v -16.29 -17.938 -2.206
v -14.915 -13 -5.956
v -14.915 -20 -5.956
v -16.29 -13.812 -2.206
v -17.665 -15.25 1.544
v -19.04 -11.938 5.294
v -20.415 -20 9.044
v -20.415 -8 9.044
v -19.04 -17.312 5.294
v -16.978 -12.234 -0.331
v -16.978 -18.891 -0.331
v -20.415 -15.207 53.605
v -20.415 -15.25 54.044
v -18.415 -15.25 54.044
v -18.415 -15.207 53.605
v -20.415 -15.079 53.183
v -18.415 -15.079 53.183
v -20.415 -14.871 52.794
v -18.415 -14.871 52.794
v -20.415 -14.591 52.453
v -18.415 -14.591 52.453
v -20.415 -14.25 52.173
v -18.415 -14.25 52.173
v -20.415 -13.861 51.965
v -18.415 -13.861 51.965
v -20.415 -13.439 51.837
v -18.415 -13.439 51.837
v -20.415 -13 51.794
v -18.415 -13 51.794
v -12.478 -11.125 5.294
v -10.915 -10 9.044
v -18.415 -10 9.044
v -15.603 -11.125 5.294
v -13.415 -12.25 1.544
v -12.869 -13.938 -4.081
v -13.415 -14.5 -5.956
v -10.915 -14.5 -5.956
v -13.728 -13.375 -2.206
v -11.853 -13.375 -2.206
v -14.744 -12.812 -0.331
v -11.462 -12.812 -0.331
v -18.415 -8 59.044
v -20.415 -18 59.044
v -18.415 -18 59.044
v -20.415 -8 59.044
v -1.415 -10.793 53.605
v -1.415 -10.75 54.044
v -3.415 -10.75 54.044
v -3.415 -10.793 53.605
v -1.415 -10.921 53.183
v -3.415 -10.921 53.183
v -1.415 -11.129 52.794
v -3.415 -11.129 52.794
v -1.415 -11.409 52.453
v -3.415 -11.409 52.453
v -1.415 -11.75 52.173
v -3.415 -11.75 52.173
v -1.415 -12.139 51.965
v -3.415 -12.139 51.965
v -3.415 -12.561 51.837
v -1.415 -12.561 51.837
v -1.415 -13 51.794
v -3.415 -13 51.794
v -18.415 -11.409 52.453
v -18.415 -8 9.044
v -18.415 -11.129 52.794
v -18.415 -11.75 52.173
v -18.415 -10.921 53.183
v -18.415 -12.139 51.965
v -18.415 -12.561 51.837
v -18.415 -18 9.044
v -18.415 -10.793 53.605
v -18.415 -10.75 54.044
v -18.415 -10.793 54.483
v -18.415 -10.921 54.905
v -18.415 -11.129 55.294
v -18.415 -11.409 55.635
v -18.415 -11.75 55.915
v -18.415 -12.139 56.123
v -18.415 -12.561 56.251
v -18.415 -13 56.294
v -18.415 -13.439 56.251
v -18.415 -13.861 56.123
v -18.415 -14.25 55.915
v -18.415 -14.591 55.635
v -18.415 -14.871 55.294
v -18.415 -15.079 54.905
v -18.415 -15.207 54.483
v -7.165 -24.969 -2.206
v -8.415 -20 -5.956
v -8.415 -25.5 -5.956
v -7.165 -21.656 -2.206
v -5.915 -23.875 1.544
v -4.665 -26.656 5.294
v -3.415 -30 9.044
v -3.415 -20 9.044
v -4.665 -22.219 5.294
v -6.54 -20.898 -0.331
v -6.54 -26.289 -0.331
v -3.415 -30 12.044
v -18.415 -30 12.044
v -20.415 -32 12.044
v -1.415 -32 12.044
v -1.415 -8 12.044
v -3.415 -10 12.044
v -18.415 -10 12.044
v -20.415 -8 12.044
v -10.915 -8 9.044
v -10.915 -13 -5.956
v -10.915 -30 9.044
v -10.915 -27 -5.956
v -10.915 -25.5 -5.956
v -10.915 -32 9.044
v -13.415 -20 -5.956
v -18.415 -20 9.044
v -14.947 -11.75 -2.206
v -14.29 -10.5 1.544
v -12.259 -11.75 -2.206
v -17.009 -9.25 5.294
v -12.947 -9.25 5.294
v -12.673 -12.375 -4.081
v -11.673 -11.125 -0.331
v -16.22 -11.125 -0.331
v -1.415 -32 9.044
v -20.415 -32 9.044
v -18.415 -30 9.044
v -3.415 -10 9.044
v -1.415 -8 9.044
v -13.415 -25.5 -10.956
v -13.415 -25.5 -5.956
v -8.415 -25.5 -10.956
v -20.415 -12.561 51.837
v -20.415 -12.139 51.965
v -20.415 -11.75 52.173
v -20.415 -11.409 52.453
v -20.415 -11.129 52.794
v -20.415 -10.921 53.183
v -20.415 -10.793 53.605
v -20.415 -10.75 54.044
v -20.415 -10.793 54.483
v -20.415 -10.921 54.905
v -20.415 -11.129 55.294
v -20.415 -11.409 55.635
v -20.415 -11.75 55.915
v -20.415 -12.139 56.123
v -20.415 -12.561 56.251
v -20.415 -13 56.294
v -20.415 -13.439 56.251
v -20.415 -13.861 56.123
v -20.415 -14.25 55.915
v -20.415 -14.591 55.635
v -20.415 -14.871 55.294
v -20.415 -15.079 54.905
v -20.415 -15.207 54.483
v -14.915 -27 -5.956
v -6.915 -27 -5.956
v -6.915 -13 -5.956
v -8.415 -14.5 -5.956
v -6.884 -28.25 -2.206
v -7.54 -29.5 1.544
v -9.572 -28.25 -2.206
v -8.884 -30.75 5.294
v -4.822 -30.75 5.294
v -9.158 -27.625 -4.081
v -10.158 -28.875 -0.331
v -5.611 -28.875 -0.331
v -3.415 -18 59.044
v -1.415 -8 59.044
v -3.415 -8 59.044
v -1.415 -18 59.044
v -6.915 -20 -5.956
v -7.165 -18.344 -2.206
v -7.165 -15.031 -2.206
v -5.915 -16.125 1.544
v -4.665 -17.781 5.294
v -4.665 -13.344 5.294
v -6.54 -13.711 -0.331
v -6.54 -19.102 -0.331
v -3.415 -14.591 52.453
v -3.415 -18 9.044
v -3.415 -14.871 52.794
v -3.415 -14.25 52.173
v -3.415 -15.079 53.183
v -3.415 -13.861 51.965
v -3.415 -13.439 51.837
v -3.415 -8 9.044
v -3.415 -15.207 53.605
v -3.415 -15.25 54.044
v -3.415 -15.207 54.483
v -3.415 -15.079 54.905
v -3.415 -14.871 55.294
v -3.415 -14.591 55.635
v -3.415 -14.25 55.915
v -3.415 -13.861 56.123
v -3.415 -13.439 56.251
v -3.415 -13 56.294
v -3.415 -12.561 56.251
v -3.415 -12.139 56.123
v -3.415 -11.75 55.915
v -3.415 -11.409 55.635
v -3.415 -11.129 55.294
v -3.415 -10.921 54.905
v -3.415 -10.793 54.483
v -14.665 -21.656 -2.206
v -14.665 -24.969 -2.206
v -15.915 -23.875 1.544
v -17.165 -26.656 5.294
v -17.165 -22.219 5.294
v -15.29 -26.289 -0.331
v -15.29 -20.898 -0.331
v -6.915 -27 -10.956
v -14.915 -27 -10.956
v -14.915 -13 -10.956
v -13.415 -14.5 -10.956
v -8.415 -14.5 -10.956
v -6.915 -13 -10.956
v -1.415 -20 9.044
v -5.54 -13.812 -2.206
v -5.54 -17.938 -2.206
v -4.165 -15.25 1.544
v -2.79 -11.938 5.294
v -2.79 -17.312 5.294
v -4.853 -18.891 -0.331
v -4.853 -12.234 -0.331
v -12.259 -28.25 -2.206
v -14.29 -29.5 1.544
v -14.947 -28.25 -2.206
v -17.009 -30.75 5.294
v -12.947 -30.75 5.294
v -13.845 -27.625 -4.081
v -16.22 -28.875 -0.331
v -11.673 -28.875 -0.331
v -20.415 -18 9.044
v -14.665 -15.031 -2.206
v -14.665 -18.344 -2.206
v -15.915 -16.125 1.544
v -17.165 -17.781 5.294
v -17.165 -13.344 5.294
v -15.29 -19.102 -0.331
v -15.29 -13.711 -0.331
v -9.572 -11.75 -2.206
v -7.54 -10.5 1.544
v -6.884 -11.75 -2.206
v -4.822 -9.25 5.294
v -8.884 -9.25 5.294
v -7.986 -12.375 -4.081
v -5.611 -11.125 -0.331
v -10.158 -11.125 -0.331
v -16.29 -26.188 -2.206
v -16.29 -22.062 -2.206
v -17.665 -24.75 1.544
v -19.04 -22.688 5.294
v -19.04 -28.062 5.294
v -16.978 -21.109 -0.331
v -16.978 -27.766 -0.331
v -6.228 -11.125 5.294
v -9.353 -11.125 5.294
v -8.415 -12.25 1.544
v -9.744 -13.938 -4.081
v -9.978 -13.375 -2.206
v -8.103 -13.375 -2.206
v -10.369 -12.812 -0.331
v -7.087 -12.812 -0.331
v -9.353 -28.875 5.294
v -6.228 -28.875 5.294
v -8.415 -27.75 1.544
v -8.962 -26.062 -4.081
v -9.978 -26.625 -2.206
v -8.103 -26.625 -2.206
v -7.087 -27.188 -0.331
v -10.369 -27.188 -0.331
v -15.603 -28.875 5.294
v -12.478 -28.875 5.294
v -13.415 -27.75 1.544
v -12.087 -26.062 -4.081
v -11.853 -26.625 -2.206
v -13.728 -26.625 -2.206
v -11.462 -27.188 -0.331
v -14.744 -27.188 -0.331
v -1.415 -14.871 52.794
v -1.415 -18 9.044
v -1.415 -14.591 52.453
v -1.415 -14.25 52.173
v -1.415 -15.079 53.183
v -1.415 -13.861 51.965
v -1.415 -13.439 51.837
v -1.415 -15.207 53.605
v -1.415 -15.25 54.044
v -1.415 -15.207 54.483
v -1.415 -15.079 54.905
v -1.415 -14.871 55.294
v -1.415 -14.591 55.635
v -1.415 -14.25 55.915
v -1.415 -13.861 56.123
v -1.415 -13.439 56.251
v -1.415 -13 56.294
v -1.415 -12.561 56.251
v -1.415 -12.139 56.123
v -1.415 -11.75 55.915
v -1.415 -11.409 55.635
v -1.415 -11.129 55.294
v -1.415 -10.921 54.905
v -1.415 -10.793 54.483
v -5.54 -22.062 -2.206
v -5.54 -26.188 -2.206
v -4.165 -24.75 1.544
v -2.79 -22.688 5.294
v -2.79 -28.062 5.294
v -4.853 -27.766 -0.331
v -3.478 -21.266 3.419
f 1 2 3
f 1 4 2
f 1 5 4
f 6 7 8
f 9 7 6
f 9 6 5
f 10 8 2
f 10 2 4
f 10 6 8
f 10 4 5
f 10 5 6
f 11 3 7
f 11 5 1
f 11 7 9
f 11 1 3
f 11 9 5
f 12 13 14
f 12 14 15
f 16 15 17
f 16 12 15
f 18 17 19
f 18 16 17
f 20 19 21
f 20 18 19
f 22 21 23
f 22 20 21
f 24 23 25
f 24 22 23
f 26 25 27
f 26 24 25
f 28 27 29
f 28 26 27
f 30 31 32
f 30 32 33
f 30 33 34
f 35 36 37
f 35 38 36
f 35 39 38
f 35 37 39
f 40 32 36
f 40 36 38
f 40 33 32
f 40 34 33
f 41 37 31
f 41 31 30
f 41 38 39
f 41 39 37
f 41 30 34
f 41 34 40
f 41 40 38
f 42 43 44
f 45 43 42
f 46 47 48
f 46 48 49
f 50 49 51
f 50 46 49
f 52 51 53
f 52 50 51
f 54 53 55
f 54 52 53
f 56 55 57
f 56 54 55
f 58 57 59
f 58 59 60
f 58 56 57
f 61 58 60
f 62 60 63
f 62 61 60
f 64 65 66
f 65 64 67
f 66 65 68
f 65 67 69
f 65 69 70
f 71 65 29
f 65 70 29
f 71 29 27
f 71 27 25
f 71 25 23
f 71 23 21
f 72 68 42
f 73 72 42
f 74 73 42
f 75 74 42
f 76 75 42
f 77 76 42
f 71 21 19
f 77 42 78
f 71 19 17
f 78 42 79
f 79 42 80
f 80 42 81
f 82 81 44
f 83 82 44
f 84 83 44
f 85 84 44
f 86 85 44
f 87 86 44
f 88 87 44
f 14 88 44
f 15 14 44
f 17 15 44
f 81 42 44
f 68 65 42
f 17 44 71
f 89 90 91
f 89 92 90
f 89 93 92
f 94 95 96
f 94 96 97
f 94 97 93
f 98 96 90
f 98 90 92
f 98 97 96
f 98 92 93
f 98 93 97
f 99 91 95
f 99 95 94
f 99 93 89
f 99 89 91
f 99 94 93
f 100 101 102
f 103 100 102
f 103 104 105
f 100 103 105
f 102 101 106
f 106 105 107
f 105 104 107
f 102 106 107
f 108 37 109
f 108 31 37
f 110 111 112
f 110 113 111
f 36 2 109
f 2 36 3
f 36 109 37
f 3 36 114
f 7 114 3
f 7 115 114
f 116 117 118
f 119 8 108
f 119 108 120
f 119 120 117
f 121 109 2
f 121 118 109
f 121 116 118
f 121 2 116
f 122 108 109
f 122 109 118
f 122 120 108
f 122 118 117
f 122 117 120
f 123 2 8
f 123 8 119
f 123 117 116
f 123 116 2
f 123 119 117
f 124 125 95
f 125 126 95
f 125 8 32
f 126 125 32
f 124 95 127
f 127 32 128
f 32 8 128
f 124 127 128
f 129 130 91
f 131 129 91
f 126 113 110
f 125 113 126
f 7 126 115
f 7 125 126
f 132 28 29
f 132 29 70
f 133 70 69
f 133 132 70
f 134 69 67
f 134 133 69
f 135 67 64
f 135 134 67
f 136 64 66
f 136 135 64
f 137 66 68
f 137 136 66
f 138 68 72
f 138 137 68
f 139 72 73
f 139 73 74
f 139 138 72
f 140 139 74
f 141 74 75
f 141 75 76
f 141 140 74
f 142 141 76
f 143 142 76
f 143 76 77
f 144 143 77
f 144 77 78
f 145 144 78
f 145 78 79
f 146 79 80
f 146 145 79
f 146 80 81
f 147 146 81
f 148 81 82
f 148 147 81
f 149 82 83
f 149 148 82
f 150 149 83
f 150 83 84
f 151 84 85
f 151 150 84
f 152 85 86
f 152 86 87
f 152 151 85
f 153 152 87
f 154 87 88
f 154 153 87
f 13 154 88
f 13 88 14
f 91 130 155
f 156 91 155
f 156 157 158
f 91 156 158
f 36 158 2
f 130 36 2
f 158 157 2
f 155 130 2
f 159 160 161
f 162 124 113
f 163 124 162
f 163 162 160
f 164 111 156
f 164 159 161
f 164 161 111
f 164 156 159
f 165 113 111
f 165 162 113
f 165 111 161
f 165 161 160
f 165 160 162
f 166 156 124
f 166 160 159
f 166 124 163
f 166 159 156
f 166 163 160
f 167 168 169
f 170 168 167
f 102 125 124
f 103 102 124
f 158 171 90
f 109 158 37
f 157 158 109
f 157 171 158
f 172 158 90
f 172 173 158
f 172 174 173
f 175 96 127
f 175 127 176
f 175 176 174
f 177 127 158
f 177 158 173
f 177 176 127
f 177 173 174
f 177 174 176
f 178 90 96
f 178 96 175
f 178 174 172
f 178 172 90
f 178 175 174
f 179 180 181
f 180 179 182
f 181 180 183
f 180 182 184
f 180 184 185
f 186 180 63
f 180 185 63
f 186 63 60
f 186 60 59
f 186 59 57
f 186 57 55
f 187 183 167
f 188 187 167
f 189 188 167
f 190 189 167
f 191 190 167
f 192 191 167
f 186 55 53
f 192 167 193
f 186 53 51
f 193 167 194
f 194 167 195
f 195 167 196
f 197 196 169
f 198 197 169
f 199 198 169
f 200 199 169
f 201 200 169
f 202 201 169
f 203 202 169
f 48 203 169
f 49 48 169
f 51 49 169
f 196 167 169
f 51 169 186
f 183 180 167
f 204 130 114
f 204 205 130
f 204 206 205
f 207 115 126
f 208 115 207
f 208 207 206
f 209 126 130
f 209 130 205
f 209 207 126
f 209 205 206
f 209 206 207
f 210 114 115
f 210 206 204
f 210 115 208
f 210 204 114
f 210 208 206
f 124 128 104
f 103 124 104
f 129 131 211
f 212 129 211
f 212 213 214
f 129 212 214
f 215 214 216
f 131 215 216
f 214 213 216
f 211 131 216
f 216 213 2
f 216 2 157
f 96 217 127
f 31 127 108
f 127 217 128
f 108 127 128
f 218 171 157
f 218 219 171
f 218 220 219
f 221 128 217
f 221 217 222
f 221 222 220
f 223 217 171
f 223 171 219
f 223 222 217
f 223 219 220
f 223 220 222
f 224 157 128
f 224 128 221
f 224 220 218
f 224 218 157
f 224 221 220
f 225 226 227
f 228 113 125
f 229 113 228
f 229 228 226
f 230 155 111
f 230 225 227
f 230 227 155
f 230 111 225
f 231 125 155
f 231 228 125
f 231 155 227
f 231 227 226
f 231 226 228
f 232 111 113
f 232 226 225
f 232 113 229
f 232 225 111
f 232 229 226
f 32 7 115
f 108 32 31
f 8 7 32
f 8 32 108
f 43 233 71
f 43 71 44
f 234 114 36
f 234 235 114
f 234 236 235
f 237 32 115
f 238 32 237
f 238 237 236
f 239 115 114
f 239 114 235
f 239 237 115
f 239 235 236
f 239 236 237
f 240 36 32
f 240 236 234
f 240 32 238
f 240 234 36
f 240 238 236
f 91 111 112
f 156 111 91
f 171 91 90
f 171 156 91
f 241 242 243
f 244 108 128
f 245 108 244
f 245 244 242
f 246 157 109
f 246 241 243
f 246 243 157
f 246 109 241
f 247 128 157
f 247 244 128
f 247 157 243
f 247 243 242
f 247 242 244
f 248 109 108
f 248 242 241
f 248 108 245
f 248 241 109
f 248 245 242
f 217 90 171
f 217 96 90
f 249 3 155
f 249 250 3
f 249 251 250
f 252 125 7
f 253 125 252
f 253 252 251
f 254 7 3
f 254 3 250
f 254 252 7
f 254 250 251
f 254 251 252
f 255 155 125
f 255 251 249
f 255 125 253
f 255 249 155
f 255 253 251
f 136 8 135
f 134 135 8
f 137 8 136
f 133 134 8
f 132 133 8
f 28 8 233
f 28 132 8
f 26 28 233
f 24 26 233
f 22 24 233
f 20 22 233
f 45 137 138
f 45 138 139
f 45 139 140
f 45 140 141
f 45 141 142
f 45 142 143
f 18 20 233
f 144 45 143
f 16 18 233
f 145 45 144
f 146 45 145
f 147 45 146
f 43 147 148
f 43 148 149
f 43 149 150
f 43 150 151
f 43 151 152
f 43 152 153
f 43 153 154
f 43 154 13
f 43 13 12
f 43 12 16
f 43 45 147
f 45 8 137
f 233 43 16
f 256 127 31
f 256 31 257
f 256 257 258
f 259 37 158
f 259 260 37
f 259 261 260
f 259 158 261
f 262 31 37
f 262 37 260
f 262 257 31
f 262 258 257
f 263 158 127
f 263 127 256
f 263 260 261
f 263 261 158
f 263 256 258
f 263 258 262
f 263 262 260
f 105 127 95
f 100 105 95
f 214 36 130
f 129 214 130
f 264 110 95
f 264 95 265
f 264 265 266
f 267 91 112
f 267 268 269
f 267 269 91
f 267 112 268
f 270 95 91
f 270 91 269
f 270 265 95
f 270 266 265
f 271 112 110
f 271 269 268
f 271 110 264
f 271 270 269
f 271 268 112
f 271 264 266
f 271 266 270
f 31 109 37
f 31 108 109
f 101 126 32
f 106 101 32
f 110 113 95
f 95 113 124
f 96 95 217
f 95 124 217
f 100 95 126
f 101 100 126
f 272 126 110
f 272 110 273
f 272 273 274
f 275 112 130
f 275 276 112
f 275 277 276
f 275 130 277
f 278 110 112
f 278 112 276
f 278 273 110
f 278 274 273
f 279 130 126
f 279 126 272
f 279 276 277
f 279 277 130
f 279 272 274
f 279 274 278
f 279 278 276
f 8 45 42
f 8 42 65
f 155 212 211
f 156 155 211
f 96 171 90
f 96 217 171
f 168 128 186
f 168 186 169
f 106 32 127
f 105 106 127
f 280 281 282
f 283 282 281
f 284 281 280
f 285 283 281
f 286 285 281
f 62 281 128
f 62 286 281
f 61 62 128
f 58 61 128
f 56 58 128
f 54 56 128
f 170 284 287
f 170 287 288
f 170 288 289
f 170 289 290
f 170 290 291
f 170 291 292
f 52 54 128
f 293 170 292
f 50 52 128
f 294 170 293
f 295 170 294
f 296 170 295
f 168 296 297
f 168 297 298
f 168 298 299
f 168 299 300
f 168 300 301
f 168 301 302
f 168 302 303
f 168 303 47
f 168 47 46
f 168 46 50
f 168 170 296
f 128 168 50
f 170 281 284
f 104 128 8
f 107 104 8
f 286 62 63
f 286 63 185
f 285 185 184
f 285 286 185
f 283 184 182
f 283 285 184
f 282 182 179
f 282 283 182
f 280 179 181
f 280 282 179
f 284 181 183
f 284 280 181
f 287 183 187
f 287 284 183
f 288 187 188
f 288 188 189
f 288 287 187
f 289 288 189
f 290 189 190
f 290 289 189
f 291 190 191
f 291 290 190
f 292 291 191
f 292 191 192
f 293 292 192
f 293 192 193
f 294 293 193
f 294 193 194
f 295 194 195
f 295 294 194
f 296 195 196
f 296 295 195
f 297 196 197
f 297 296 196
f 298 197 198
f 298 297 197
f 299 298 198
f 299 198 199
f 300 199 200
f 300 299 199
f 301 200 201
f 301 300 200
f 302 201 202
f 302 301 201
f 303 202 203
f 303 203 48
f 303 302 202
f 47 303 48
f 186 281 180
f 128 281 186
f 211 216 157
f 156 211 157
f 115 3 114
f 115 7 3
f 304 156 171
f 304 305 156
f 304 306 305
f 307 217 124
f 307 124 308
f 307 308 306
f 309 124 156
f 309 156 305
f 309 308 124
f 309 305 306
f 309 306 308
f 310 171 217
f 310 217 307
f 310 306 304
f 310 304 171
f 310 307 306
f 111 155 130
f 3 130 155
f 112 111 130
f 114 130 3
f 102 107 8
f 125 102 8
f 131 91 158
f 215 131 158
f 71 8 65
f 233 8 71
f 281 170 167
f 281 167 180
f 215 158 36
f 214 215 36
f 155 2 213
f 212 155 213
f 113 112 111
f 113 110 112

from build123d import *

# Parameters (mm, degrees)
F1_DEPTH  = 40
F3_W      = 8
F3_H      = 13
F4_DEPTH  = 25
F2_W      = 9.5
F2_H      = 8
F5_DEPTH  = 25
F7_DEPTH  = 25
F6_W      = 2.5
F6_H      = 5.5
F8_DEPTH  = 25
F13_W     = 5
F13_H     = 4.5464889724
F14_DEPTH = 2
F16_DEPTH = 2


with BuildPart() as f1:
    # F0 (on Front) → F1 (new body)
    with BuildSketch(Plane.XZ):
        Polygon((-1.4153950295, 12.043859912), (-20.4153950295, 12.043859912), (-20.4153950295, 9.043859912), (-10.9153950295, 9.043859912), (-1.4153950295, 9.043859912), align=None)
    extrude(amount=F1_DEPTH)

    # F2 (on face) → F5 (cut)
    with BuildSketch(Plane(origin=(0, 0, 9.043859912), x_dir=(1, 0, 0), z_dir=(0, 0, -1))):
        with Locations((-6.1653950295, 36)):
            Rectangle(F2_W, F2_H)
        with Locations((-15.6653950295, 36)):
            Rectangle(F2_W, F2_H)
        Polygon((-1.4153950295, 0), (-1.4153950295, 8), (-10.9153950295, 8), (-20.4153950295, 8), (-20.4153950295, 0), (-10.9153950295, 0), align=None)
    extrude(amount=-F5_DEPTH, mode=Mode.SUBTRACT)

    # F2 (on face) → F7 (cut)
    with BuildSketch(Plane(origin=(0, 0, 9.043859912), x_dir=(1, 0, 0), z_dir=(0, 0, -1))):
        Polygon((-3.4153950295, 10), (-3.4153950295, 20), (-18.4153950295, 20), (-18.4153950295, 10), (-10.9153950295, 10), align=None)
        Polygon((-18.4153950295, 20), (-3.4153950295, 20), (-3.4153950295, 30), (-10.9153950295, 30), (-18.4153950295, 30), align=None)
    extrude(amount=-F7_DEPTH, mode=Mode.SUBTRACT)


with BuildPart() as f1b:
    # F0 (on Front) → F1, piece 2 (new body)
    with BuildSketch(Plane.XZ):
        Polygon((-6.9153950295, -5.956140088), (-10.9153950295, -5.956140088), (-14.9153950295, -5.956140088), (-14.9153950295, -10.956140088), (-6.9153950295, -10.956140088), align=None)
    extrude(amount=F1_DEPTH)

    # F3 (on face) → F4 (cut)
    with BuildSketch(Plane(origin=(0, 0, -10.956140088), x_dir=(1, 0, 0), z_dir=(0, 0, -1))):
        with Locations((-10.9153950295, 33.5)):
            Rectangle(F3_W, F3_H)
        with Locations((-10.9153950295, 6.5)):
            Rectangle(F3_W, F3_H)
    extrude(amount=-F4_DEPTH, mode=Mode.SUBTRACT)

    # F6 (on face) → F8 (cut)
    with BuildSketch(Plane.XY.offset(-5.956140088)):
        with Locations((-12.1653950295, -17.25)):
            Rectangle(F6_W, F6_H)
        with Locations((-9.6653950295, -17.25)):
            Rectangle(F6_W, F6_H)
        with Locations((-9.6653950295, -22.75)):
            Rectangle(F6_W, F6_H)
        with Locations((-12.1653950295, -22.75)):
            Rectangle(F6_W, F6_H)
    extrude(amount=-F8_DEPTH, mode=Mode.SUBTRACT)


with BuildPart() as f9:
    # F6 (on face) → F9 section 0
    with BuildSketch(Plane.XY.offset(-5.956140088)):
        Polygon((-14.9153950295, -13), (-14.9153950295, -20), (-13.4153950295, -20), (-13.4153950295, -14.5), (-10.9153950295, -14.5), (-10.9153950295, -13), align=None)
    # F2 (on face) → F9 section 1
    with BuildSketch(Plane(origin=(0, 0, 9.043859912), x_dir=(1, 0, 0), z_dir=(0, 0, -1))):
        Polygon((-18.4153950295, 10), (-18.4153950295, 20), (-20.4153950295, 20), (-20.4153950295, 8), (-10.9153950295, 8), (-10.9153950295, 10), align=None)
    loft()


with BuildPart() as f10:
    # F6 (on face) → F10 section 0
    with BuildSketch(Plane.XY.offset(-5.956140088)):
        Polygon((-8.4153950295, -20), (-6.9153950295, -20), (-6.9153950295, -13), (-10.9153950295, -13), (-10.9153950295, -14.5), (-8.4153950295, -14.5), align=None)
    # F2 (on face) → F10 section 1
    with BuildSketch(Plane(origin=(0, 0, 9.043859912), x_dir=(1, 0, 0), z_dir=(0, 0, -1))):
        Polygon((-1.4153950295, 8), (-1.4153950295, 20), (-3.4153950295, 20), (-3.4153950295, 10), (-10.9153950295, 10), (-10.9153950295, 8), align=None)
    loft()


with BuildPart() as f11:
    # F6 (on face) → F11 section 0
    with BuildSketch(Plane.XY.offset(-5.956140088)):
        Polygon((-10.9153950295, -25.5), (-10.9153950295, -27), (-6.9153950295, -27), (-6.9153950295, -20), (-8.4153950295, -20), (-8.4153950295, -25.5), align=None)
    # F2 (on face) → F11 section 1
    with BuildSketch(Plane(origin=(0, 0, 9.043859912), x_dir=(1, 0, 0), z_dir=(0, 0, -1))):
        Polygon((-3.4153950295, 20), (-1.4153950295, 20), (-1.4153950295, 32), (-10.9153950295, 32), (-10.9153950295, 30), (-3.4153950295, 30), align=None)
    loft()


with BuildPart() as f12:
    # F6 (on face) → F12 section 0
    with BuildSketch(Plane.XY.offset(-5.956140088)):
        Polygon((-14.9153950295, -27), (-10.9153950295, -27), (-10.9153950295, -25.5), (-13.4153950295, -25.5), (-13.4153950295, -20), (-14.9153950295, -20), align=None)
    # F2 (on face) → F12 section 1
    with BuildSketch(Plane(origin=(0, 0, 9.043859912), x_dir=(1, 0, 0), z_dir=(0, 0, -1))):
        Polygon((-20.4153950295, 20), (-18.4153950295, 20), (-18.4153950295, 30), (-10.9153950295, 30), (-10.9153950295, 32), (-20.4153950295, 32), align=None)
    loft()


with BuildPart() as f14:
    # F13 (on face) → F14 (new body)
    with BuildSketch(Plane.YZ.offset(-1.4153950295)):
        with Locations((-10.5, 11.3171043982)):
            Rectangle(F13_W, F13_H)
        Polygon((-18, 9.043859912), (-13, 9.043859912), (-13, 13.5903488845), (-8, 13.5903488845), (-8, 59.043859912), (-18, 59.043859912), align=None)
        with BuildLine():
            ThreePointArc((-10.75, 54.043859912), (-11.4090097423, 52.4528696544), (-13, 51.793859912))
            ThreePointArc((-13, 51.793859912), (-14.5909902577, 55.6348501697), (-10.75, 54.043859912))
        make_face(mode=Mode.SUBTRACT)
    extrude(amount=-F14_DEPTH)


with BuildPart() as f16:
    # F15 (on face) → F16 (new body)
    with BuildSketch(Plane(origin=(-20.4153950295, 0, 0), x_dir=(0, -1, 0), z_dir=(-1, 0, 0))):
        Polygon((8, 59.043859912), (8, 9.043859912), (13, 9.043859912), (18, 9.043859912), (18, 59.043859912), align=None)
        with BuildLine():
            ThreePointArc((15.25, 54.043859912), (14.5909902577, 52.4528696544), (13, 51.793859912))
            ThreePointArc((13, 51.793859912), (11.4090097423, 55.6348501697), (15.25, 54.043859912))
        make_face(mode=Mode.SUBTRACT)
    extrude(amount=-F16_DEPTH)


solid = Compound([f1.part, f1b.part, f9.part, f10.part, f11.part, f12.part, f14.part, f16.part])
